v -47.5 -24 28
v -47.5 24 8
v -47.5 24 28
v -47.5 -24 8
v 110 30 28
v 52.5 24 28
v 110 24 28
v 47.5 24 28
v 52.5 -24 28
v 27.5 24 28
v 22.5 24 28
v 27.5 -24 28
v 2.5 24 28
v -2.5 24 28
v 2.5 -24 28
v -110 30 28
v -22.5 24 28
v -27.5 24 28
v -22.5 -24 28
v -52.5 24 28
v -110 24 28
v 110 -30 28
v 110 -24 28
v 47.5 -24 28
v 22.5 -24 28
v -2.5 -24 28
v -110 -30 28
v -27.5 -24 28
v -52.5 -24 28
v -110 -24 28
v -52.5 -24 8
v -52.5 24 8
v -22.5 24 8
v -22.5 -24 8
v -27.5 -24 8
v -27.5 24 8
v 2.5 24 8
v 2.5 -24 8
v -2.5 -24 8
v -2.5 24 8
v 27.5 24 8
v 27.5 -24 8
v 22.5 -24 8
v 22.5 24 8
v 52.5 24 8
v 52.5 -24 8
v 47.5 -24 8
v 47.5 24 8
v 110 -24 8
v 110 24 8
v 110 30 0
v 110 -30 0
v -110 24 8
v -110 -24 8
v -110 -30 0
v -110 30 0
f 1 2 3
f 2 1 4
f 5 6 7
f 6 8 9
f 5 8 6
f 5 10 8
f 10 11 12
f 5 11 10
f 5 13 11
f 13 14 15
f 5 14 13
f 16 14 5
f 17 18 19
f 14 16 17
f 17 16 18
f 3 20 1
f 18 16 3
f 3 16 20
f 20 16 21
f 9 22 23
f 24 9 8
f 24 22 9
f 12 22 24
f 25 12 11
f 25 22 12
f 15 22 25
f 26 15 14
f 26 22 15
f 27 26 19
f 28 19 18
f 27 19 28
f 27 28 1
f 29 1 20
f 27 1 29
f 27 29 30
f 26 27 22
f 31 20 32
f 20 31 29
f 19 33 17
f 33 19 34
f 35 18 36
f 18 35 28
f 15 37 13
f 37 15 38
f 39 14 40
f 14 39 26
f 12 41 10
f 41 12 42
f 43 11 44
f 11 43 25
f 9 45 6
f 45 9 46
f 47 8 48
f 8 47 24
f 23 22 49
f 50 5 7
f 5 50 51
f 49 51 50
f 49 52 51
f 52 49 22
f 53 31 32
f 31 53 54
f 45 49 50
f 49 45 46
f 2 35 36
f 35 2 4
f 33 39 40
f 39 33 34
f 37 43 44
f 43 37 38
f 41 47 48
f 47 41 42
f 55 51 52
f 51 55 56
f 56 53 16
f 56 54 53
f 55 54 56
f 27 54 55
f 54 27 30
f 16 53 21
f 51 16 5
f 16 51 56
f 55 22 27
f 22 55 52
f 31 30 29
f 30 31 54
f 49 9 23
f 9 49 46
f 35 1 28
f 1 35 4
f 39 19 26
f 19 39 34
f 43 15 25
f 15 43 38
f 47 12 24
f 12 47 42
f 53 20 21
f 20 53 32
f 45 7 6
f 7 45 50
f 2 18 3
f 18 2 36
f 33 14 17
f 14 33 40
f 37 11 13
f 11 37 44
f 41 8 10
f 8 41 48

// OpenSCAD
$fn = 32;

// ----------------------------------------------------------------------
// Rib frame 220 x 60 x 28
// 5 ribs at 25 mm pitch
// ----------------------------------------------------------------------

// --- parameters (mm) ---
frame = [220, 60, 8];  // base plate size (x, y, z)
rail_w = 6;            // side rail width
ribs = 5;              // number of ribs
rib_t = 5;             // rib thickness
rib_h = 20;            // rib height above the base plate
pitch = 25;            // pitch between rib centres

// --- derived feature positions (mm) ---
span = (ribs - 1) * pitch;          // = 100   distance between the outer ribs
origin_x = -span / 2;               // = -50   X of the first rib
rib_len = frame[1] - 2 * rail_w + 2;  // = 50   rib length, 1 mm into each rail
feature_centers = [
  [origin_x + 0 * pitch, 0],
  [origin_x + 1 * pitch, 0],
  [origin_x + 2 * pitch, 0],
  [origin_x + 3 * pitch, 0],
  [origin_x + 4 * pitch, 0]
];   // rib centre line, drives the rib loop

// base plate, two side rails, then the ribs read straight off feature_centers
union() {
  translate([-frame[0] / 2, -frame[1] / 2, 0]) cube(frame);
  translate([-frame[0] / 2, -frame[1] / 2, 0]) cube([frame[0], rail_w, frame[2] + rib_h]);
  translate([-frame[0] / 2, frame[1] / 2 - rail_w, 0]) cube([frame[0], rail_w, frame[2] + rib_h]);
  for (centre = feature_centers)
    translate([centre[0] - rib_t / 2, centre[1] - rib_len / 2, frame[2] - 1])
      cube([rib_t, rib_len, rib_h + 1]);
}
